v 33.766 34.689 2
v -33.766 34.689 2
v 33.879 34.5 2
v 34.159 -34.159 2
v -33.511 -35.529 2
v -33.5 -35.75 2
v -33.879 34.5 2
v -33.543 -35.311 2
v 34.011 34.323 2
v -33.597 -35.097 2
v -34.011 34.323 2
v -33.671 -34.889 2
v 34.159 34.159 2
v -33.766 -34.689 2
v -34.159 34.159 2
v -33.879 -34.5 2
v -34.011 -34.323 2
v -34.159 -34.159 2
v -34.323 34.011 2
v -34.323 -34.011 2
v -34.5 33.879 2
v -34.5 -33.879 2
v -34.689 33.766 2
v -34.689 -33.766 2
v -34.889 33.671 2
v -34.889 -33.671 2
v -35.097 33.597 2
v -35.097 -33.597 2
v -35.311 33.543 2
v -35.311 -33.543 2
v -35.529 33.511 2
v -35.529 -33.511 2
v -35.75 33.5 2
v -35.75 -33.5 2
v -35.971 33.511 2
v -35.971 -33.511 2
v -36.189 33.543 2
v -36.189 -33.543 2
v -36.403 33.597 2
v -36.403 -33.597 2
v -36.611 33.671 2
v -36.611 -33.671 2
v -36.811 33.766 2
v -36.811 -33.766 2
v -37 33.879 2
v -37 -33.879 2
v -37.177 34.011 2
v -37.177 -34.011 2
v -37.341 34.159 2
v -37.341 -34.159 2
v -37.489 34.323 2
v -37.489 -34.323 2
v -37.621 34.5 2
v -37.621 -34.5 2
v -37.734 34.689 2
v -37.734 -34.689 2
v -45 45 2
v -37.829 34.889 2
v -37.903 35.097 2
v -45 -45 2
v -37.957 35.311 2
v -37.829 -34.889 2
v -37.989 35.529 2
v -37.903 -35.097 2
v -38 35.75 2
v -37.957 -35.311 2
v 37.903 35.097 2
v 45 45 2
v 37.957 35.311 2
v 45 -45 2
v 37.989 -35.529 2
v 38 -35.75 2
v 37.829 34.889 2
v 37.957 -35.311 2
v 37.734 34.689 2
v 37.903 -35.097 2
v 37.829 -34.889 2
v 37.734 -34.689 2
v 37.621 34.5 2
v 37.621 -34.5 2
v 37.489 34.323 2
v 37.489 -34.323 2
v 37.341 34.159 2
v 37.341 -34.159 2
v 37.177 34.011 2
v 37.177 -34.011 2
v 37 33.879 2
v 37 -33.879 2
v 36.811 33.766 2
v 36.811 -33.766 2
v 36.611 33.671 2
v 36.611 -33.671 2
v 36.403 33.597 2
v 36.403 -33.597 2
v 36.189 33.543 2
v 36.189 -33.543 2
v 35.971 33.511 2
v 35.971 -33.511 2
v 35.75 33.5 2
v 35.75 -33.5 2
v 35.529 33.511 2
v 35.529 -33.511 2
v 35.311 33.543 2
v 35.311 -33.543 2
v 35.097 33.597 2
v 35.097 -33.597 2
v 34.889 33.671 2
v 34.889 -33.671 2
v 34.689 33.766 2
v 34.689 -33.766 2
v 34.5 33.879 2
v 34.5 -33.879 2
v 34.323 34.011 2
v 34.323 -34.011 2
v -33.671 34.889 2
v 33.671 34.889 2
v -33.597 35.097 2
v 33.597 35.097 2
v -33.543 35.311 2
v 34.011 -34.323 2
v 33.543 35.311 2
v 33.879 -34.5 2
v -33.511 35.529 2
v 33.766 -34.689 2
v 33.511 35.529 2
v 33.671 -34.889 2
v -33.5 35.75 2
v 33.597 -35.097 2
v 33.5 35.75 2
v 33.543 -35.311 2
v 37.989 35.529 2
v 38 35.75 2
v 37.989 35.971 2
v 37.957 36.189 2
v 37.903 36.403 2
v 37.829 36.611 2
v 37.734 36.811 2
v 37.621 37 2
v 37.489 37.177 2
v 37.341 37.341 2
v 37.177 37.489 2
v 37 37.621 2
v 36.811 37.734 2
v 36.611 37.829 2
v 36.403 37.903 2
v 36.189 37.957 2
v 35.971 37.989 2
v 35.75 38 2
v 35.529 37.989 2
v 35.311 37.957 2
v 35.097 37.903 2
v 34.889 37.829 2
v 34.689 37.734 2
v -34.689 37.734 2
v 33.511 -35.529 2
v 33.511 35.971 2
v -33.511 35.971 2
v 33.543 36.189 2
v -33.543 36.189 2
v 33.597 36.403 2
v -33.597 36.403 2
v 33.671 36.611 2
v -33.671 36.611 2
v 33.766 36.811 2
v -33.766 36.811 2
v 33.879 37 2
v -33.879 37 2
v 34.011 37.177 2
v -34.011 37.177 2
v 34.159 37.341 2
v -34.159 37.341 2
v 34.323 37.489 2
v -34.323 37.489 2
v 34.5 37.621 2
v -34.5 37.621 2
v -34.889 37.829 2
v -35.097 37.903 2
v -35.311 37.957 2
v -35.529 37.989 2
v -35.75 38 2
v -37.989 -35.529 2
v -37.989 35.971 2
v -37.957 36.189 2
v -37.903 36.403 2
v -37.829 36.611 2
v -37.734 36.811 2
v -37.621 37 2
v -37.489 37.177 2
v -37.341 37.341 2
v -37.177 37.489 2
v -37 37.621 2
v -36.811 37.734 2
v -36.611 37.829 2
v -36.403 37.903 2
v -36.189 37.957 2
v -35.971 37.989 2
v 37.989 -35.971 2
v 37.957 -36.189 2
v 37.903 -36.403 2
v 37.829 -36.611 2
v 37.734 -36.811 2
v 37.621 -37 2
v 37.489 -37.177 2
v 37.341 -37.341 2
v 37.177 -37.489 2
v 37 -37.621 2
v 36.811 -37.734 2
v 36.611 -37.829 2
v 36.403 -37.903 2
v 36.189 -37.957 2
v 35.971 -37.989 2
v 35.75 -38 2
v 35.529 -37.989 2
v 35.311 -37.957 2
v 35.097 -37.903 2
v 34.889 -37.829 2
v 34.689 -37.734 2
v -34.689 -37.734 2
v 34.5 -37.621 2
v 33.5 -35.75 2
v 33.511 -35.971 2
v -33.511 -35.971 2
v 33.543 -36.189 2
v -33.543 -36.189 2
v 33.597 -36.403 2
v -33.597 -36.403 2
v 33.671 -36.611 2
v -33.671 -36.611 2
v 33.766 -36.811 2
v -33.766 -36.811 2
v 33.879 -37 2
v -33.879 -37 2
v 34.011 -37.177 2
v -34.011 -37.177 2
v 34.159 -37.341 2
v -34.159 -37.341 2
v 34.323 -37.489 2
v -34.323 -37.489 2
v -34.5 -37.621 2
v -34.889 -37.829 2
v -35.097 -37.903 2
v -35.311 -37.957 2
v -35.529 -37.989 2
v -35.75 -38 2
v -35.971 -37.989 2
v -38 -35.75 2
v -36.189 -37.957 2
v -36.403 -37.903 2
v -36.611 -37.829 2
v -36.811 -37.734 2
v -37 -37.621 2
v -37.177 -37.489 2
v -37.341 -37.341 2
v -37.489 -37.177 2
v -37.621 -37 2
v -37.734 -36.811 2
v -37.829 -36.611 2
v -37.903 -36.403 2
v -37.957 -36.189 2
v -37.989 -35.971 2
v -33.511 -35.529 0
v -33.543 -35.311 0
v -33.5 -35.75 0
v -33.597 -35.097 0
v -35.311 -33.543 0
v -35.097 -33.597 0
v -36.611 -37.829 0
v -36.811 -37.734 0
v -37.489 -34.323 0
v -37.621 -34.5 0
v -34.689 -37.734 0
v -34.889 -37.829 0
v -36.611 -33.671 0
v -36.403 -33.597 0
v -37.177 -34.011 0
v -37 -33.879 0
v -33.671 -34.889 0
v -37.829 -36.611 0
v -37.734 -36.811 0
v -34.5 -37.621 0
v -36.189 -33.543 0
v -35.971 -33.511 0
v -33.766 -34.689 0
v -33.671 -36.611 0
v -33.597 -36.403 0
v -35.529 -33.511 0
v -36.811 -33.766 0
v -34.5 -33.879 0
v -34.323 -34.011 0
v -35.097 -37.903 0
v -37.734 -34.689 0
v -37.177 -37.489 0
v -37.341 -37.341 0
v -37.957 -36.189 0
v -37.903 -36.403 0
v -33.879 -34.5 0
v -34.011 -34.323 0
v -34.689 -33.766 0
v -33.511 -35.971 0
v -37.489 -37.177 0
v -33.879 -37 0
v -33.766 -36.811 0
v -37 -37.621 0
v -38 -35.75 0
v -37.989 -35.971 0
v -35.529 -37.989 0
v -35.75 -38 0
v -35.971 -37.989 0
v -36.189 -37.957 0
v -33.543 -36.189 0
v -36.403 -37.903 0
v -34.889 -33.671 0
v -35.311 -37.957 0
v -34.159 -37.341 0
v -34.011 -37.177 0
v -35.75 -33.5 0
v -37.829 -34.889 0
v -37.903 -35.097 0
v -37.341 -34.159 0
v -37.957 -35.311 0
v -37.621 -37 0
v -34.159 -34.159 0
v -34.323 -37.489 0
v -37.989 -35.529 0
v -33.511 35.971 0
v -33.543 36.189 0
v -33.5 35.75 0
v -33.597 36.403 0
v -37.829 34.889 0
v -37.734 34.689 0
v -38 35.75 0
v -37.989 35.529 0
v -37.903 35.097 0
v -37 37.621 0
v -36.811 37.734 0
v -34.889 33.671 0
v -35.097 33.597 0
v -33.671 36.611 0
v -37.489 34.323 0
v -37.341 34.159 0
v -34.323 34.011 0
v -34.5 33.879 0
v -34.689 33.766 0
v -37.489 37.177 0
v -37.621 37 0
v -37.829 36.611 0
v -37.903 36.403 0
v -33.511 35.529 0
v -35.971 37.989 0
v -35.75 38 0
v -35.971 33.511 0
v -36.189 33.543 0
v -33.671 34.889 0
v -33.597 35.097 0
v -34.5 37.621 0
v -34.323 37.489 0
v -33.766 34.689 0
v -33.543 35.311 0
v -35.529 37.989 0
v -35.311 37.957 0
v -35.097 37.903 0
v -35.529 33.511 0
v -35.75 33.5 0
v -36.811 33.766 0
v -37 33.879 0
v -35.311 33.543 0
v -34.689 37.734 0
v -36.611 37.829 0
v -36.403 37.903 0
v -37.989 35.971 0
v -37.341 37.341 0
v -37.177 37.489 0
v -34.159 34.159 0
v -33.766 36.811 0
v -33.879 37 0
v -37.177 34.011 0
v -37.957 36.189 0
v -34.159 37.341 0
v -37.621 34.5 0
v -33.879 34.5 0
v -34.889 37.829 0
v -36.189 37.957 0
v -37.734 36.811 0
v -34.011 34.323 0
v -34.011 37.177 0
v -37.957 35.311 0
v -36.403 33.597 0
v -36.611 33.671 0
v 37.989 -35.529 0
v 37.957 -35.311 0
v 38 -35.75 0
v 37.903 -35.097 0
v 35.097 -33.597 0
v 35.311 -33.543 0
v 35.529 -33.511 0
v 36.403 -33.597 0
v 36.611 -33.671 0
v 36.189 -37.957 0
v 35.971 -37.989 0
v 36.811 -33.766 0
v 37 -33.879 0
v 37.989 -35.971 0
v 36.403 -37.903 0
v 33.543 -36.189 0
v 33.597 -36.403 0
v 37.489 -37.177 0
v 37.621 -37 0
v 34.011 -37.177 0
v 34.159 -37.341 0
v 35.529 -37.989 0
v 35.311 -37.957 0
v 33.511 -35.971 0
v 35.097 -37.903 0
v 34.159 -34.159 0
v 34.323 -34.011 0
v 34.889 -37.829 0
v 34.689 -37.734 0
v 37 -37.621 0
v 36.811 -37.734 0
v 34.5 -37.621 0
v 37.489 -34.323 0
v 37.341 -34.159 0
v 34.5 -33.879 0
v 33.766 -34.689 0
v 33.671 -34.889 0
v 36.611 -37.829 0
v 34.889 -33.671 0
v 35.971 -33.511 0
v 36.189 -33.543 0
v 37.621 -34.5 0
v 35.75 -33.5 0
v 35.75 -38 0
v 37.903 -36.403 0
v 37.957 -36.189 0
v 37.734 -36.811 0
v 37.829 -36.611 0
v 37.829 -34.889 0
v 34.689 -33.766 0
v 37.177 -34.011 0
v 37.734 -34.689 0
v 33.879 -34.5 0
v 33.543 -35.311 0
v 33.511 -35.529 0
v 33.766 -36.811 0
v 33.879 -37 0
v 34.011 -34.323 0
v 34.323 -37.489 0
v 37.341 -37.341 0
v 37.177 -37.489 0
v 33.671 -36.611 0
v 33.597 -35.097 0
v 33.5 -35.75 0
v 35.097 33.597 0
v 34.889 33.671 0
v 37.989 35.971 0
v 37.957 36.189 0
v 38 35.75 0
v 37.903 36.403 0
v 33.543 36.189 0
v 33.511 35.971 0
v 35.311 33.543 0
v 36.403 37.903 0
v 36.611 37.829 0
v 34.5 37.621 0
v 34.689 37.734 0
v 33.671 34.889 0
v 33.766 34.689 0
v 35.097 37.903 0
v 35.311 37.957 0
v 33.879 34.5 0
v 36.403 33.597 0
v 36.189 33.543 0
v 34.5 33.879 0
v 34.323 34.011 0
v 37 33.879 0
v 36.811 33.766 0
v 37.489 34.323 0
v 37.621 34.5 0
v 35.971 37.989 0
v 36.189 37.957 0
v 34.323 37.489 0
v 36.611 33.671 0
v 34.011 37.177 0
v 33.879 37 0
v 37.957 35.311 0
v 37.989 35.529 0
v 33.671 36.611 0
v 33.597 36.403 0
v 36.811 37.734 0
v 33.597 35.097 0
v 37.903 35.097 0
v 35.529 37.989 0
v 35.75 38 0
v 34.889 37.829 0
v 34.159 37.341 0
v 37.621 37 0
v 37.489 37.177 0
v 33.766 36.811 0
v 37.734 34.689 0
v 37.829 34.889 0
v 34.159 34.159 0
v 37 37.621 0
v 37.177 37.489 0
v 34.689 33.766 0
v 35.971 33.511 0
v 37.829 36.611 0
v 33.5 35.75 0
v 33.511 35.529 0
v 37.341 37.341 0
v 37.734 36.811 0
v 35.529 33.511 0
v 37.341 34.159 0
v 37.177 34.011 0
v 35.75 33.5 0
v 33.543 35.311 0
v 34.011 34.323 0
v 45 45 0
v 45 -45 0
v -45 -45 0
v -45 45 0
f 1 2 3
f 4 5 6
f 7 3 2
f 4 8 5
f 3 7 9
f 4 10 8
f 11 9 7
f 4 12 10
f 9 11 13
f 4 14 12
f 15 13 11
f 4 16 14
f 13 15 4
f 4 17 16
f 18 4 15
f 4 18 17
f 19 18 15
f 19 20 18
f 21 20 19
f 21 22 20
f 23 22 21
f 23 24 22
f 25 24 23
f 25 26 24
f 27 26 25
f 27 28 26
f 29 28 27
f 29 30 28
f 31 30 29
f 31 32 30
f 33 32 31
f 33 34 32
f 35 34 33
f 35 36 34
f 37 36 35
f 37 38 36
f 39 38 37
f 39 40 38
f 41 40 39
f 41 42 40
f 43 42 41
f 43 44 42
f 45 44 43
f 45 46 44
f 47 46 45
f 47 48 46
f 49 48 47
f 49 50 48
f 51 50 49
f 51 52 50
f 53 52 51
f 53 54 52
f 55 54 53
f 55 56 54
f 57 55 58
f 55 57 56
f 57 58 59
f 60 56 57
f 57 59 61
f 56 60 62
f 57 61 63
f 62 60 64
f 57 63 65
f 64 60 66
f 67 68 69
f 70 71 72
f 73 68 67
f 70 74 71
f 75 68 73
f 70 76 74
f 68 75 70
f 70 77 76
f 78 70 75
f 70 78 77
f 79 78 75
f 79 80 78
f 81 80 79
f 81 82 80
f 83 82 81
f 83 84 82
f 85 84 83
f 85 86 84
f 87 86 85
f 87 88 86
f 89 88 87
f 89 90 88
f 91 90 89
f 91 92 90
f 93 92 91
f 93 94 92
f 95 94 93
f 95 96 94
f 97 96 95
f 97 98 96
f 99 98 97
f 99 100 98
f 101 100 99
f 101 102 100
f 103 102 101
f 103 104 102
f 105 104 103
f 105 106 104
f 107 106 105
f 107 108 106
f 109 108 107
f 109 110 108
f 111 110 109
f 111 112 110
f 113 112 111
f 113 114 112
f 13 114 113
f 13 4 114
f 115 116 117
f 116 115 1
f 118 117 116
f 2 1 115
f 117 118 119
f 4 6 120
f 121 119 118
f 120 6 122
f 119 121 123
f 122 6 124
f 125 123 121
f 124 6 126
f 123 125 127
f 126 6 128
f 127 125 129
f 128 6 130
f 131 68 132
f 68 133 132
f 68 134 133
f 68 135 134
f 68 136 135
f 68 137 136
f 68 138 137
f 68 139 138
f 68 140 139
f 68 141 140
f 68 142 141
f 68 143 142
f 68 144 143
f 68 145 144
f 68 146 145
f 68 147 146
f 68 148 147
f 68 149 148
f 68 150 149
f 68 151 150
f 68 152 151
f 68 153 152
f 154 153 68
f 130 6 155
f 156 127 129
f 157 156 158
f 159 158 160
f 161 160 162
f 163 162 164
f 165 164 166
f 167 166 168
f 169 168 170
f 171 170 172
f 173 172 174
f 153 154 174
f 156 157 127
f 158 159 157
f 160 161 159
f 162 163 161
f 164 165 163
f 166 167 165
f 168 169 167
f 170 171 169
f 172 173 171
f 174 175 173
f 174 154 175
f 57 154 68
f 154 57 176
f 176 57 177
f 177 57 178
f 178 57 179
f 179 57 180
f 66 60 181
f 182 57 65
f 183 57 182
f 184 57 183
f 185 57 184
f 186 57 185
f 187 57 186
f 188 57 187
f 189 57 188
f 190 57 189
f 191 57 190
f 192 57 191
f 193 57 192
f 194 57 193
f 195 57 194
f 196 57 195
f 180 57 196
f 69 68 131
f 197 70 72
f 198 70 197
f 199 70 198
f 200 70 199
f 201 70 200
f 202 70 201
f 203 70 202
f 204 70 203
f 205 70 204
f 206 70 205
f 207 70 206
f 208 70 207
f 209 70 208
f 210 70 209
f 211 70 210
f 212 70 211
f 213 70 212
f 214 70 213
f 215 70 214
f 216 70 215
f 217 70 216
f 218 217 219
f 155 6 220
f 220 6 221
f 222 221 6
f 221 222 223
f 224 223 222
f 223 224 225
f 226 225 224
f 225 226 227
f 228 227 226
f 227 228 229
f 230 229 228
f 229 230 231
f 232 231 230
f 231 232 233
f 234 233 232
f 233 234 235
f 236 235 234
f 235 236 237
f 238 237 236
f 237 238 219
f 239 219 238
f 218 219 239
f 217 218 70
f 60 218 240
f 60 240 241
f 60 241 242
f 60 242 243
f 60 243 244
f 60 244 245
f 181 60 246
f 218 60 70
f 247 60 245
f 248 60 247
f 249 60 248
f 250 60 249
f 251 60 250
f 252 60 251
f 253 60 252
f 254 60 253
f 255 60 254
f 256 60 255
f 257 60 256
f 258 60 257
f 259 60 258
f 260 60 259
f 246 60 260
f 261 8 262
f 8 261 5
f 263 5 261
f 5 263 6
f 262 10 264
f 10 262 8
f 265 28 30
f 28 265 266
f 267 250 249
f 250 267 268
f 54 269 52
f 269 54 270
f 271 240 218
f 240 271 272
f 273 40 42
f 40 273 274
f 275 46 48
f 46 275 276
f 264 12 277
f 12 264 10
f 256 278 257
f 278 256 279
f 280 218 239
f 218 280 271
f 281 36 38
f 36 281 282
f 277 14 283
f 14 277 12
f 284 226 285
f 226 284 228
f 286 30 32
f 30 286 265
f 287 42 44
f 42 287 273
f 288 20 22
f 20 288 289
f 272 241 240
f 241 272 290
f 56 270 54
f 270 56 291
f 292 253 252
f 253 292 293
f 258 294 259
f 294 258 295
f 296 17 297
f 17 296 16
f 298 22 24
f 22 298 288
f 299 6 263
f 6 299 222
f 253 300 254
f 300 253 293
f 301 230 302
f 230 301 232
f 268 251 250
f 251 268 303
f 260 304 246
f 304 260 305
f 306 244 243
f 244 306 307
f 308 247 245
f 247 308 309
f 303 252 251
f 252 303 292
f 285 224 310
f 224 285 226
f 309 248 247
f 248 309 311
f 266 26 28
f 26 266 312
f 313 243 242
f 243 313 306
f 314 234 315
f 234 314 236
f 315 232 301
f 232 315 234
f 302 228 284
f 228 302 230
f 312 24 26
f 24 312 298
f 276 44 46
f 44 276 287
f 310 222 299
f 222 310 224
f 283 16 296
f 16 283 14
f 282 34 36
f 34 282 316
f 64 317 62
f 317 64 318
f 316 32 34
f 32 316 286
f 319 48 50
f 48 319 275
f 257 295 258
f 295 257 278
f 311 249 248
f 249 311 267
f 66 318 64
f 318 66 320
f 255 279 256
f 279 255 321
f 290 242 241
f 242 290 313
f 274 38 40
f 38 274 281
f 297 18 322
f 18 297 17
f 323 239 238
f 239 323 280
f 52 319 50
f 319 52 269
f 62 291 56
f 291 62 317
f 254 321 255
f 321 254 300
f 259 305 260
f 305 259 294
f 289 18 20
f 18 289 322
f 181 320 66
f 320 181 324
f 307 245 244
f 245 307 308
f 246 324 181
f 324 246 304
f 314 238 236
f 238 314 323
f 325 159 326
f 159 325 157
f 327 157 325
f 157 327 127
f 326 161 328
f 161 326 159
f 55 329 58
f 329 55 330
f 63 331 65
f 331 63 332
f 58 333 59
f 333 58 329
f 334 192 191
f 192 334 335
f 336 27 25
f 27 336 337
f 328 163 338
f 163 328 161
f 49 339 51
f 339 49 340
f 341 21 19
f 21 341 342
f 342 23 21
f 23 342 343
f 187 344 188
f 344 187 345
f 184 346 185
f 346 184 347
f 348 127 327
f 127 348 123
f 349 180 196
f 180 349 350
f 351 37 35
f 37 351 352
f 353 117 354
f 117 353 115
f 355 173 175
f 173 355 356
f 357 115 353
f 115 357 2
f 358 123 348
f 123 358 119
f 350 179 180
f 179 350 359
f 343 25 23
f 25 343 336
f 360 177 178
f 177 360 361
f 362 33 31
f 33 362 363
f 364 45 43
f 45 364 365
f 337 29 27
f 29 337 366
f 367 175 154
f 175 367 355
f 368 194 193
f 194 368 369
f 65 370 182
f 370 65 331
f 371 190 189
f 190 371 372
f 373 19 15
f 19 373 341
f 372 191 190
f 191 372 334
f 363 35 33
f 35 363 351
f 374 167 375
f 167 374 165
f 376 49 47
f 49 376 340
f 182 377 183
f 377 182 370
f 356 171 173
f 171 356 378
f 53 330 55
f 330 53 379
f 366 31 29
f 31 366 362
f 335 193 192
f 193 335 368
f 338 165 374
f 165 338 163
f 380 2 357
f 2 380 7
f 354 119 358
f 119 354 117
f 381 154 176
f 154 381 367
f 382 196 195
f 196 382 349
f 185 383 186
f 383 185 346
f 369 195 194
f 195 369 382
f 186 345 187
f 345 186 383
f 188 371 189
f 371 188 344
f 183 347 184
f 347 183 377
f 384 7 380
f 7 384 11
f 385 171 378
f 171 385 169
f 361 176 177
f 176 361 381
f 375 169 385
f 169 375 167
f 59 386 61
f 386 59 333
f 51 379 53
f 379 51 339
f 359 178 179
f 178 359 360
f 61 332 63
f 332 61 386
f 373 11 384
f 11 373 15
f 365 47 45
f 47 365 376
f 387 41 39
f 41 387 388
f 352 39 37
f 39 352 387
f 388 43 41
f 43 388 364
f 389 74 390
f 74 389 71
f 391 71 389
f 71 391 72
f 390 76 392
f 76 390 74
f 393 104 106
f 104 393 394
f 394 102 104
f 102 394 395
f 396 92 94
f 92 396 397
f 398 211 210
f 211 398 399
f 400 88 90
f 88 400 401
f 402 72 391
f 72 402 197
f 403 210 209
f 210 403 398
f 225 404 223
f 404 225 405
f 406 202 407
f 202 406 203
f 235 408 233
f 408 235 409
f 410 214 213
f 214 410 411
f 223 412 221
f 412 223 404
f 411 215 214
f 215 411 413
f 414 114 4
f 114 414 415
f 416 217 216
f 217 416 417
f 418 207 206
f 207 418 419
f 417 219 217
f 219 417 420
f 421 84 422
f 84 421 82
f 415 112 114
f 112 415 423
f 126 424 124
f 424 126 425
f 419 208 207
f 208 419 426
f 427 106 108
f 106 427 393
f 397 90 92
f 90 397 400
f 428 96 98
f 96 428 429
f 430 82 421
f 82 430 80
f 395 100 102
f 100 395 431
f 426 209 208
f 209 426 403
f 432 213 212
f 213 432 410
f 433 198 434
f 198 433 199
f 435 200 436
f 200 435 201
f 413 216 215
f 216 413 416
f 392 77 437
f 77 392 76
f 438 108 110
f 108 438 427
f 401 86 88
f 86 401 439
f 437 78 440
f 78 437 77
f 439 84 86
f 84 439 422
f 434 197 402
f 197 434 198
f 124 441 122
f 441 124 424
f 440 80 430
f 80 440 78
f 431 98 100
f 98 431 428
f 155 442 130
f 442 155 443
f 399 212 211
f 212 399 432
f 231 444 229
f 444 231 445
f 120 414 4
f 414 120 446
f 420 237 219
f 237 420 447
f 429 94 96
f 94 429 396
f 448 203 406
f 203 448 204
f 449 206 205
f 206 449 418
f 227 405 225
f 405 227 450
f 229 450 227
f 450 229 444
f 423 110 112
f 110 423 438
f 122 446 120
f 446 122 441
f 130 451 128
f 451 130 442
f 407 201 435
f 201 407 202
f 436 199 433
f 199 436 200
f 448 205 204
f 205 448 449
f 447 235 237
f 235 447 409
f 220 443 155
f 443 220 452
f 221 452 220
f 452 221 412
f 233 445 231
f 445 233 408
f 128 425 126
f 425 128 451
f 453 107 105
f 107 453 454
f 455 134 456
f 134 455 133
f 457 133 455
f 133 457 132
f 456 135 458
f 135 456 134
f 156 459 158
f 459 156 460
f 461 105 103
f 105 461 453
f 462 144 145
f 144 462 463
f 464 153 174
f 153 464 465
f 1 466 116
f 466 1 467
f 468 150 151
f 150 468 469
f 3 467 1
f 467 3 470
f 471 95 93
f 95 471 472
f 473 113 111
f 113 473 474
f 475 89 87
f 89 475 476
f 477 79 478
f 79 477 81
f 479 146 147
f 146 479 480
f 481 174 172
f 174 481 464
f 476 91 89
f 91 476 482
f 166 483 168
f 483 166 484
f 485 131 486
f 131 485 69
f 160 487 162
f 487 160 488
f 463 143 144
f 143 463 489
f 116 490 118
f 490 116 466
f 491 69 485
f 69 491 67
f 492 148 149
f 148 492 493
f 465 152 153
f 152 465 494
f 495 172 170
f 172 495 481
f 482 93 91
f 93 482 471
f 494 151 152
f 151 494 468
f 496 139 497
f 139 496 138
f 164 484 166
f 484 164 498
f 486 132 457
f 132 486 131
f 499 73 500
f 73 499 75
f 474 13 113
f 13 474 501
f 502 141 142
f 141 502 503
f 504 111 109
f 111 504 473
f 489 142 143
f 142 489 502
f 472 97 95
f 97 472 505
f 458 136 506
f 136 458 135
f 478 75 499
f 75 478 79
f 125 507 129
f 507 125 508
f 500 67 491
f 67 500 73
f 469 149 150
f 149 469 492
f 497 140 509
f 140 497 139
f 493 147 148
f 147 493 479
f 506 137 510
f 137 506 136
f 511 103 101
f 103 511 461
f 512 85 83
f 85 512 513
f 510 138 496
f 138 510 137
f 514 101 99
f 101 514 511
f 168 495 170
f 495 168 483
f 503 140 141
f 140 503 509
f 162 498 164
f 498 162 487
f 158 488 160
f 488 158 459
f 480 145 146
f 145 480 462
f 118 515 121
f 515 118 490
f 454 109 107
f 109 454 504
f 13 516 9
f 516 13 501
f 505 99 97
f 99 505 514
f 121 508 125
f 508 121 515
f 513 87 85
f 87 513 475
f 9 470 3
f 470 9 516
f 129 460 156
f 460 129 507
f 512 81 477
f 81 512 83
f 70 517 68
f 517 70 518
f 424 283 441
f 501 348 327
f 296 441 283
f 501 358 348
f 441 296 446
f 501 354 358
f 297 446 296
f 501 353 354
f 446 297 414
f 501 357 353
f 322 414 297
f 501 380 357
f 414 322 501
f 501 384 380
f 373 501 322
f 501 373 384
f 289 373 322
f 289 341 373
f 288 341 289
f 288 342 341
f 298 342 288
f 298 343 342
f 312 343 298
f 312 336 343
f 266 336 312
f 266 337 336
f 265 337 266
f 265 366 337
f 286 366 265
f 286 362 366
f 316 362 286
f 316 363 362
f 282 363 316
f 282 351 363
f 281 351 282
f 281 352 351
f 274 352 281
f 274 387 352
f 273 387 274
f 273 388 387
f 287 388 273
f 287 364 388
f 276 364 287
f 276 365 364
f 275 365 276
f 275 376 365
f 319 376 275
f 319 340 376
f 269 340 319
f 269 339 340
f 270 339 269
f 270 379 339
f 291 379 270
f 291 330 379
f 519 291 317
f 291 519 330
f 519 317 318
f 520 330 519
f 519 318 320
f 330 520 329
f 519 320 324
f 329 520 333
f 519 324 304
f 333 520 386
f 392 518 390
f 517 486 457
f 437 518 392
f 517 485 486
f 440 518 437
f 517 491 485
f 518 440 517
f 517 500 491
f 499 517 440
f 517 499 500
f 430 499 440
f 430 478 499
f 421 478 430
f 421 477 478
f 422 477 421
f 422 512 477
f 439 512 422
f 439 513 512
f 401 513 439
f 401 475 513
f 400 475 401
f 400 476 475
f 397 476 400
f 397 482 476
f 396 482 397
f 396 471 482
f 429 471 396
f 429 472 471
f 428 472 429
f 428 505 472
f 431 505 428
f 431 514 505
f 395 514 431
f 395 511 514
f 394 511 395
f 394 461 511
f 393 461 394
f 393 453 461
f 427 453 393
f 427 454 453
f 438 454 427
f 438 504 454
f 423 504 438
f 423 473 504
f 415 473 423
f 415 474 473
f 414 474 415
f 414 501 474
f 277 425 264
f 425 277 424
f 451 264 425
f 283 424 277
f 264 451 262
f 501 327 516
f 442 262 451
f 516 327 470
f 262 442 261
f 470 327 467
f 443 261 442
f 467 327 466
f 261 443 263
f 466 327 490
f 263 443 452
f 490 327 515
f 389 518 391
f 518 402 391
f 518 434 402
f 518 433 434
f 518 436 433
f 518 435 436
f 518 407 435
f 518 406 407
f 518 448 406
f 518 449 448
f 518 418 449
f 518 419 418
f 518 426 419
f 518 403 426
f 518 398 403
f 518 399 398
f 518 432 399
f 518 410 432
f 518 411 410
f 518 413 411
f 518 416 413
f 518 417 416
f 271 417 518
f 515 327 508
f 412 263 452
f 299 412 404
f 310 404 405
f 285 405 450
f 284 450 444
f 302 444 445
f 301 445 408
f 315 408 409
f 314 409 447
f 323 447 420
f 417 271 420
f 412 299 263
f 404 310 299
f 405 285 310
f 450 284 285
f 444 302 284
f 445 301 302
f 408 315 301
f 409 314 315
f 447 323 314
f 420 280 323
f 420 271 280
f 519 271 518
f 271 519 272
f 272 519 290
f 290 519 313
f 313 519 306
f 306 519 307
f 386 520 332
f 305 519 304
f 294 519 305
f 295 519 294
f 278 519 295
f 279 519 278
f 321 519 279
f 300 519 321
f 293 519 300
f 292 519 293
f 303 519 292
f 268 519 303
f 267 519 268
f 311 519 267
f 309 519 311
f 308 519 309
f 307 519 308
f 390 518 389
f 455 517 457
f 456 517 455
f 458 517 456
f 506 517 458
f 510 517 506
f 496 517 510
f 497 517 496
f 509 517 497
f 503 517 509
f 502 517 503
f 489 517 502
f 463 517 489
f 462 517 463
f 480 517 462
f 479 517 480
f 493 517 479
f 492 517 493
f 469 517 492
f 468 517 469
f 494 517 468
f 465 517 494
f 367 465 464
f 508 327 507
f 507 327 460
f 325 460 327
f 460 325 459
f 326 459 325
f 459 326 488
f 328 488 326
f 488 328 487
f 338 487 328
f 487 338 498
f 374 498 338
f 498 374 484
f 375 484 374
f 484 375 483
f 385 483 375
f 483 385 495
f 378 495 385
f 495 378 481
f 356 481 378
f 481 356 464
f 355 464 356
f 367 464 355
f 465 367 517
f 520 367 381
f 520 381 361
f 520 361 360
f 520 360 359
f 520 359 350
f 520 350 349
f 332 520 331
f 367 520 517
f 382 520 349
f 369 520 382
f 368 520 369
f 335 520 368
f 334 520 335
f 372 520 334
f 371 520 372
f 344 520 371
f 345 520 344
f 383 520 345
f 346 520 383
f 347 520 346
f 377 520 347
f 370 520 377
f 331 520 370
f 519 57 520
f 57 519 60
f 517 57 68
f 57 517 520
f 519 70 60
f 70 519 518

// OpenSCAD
// Magnetic stirrer housing - upside-down open box over a 80 mm PC fan
// Print orientation: top plate on bed (z = 0), walls rise to open top (z = 40)

// ---------- Parameters ----------
plate_t      = 2;     // top plate thickness
wall_t       = 2.5;   // wall thickness
box_h        = 40;    // total height (open top at z = 40)
outer_x      = 90;    // outer size in X
outer_y      = 90;    // outer size in Y
screw_d      = 4.5;   // M4 screw hole diameter
screw_n      = 4;     // number of screw holes
screw_pitch  = 71.5;  // square pattern pitch (centre to centre)
notch_w      = 12;    // cable notch width
notch_d      = 8;     // cable notch depth from open edge
eps          = 0.5;   // cutter overshoot past faces

$fn = 64;

// ---------- Model ----------
difference() {
    // Closed top plate
    translate([-outer_x/2, -outer_y/2, 0])
        cube([outer_x, outer_y, plate_t]);

    // Four walls, open top, with overshoot above the open edge
    for (a = [0, 90, 180, 270])
        rotate([0, 0, a])
            translate([-outer_x/2 - eps, -outer_y/2 - eps, plate_t])
                cube([outer_x/2 + eps, outer_y/2 + eps, box_h - plate_t + eps]);

    // Screw holes through the top plate, centred square pattern
    for (i = [0 : screw_n - 1]) {
        for (j = [0 : screw_n - 1]) {
            x = (i - (screw_n - 1)/2) * screw_pitch;
            y = (j - (screw_n - 1)/2) * screw_pitch;
            translate([x, y, -eps])
                cylinder(d = screw_d, h = plate_t + 2*eps);
        }
    }

    // Cable notch in one wall: 12 mm wide, centred along the wall,
    // reaching 8 mm down from the open edge (z = 32 to z = 40)
    translate([-outer_x/2 - eps, -outer_y/2 - eps, box_h - notch_d])
        cube([outer_x/2 + eps, notch_w + 2*eps, notch_d + eps]);
}
